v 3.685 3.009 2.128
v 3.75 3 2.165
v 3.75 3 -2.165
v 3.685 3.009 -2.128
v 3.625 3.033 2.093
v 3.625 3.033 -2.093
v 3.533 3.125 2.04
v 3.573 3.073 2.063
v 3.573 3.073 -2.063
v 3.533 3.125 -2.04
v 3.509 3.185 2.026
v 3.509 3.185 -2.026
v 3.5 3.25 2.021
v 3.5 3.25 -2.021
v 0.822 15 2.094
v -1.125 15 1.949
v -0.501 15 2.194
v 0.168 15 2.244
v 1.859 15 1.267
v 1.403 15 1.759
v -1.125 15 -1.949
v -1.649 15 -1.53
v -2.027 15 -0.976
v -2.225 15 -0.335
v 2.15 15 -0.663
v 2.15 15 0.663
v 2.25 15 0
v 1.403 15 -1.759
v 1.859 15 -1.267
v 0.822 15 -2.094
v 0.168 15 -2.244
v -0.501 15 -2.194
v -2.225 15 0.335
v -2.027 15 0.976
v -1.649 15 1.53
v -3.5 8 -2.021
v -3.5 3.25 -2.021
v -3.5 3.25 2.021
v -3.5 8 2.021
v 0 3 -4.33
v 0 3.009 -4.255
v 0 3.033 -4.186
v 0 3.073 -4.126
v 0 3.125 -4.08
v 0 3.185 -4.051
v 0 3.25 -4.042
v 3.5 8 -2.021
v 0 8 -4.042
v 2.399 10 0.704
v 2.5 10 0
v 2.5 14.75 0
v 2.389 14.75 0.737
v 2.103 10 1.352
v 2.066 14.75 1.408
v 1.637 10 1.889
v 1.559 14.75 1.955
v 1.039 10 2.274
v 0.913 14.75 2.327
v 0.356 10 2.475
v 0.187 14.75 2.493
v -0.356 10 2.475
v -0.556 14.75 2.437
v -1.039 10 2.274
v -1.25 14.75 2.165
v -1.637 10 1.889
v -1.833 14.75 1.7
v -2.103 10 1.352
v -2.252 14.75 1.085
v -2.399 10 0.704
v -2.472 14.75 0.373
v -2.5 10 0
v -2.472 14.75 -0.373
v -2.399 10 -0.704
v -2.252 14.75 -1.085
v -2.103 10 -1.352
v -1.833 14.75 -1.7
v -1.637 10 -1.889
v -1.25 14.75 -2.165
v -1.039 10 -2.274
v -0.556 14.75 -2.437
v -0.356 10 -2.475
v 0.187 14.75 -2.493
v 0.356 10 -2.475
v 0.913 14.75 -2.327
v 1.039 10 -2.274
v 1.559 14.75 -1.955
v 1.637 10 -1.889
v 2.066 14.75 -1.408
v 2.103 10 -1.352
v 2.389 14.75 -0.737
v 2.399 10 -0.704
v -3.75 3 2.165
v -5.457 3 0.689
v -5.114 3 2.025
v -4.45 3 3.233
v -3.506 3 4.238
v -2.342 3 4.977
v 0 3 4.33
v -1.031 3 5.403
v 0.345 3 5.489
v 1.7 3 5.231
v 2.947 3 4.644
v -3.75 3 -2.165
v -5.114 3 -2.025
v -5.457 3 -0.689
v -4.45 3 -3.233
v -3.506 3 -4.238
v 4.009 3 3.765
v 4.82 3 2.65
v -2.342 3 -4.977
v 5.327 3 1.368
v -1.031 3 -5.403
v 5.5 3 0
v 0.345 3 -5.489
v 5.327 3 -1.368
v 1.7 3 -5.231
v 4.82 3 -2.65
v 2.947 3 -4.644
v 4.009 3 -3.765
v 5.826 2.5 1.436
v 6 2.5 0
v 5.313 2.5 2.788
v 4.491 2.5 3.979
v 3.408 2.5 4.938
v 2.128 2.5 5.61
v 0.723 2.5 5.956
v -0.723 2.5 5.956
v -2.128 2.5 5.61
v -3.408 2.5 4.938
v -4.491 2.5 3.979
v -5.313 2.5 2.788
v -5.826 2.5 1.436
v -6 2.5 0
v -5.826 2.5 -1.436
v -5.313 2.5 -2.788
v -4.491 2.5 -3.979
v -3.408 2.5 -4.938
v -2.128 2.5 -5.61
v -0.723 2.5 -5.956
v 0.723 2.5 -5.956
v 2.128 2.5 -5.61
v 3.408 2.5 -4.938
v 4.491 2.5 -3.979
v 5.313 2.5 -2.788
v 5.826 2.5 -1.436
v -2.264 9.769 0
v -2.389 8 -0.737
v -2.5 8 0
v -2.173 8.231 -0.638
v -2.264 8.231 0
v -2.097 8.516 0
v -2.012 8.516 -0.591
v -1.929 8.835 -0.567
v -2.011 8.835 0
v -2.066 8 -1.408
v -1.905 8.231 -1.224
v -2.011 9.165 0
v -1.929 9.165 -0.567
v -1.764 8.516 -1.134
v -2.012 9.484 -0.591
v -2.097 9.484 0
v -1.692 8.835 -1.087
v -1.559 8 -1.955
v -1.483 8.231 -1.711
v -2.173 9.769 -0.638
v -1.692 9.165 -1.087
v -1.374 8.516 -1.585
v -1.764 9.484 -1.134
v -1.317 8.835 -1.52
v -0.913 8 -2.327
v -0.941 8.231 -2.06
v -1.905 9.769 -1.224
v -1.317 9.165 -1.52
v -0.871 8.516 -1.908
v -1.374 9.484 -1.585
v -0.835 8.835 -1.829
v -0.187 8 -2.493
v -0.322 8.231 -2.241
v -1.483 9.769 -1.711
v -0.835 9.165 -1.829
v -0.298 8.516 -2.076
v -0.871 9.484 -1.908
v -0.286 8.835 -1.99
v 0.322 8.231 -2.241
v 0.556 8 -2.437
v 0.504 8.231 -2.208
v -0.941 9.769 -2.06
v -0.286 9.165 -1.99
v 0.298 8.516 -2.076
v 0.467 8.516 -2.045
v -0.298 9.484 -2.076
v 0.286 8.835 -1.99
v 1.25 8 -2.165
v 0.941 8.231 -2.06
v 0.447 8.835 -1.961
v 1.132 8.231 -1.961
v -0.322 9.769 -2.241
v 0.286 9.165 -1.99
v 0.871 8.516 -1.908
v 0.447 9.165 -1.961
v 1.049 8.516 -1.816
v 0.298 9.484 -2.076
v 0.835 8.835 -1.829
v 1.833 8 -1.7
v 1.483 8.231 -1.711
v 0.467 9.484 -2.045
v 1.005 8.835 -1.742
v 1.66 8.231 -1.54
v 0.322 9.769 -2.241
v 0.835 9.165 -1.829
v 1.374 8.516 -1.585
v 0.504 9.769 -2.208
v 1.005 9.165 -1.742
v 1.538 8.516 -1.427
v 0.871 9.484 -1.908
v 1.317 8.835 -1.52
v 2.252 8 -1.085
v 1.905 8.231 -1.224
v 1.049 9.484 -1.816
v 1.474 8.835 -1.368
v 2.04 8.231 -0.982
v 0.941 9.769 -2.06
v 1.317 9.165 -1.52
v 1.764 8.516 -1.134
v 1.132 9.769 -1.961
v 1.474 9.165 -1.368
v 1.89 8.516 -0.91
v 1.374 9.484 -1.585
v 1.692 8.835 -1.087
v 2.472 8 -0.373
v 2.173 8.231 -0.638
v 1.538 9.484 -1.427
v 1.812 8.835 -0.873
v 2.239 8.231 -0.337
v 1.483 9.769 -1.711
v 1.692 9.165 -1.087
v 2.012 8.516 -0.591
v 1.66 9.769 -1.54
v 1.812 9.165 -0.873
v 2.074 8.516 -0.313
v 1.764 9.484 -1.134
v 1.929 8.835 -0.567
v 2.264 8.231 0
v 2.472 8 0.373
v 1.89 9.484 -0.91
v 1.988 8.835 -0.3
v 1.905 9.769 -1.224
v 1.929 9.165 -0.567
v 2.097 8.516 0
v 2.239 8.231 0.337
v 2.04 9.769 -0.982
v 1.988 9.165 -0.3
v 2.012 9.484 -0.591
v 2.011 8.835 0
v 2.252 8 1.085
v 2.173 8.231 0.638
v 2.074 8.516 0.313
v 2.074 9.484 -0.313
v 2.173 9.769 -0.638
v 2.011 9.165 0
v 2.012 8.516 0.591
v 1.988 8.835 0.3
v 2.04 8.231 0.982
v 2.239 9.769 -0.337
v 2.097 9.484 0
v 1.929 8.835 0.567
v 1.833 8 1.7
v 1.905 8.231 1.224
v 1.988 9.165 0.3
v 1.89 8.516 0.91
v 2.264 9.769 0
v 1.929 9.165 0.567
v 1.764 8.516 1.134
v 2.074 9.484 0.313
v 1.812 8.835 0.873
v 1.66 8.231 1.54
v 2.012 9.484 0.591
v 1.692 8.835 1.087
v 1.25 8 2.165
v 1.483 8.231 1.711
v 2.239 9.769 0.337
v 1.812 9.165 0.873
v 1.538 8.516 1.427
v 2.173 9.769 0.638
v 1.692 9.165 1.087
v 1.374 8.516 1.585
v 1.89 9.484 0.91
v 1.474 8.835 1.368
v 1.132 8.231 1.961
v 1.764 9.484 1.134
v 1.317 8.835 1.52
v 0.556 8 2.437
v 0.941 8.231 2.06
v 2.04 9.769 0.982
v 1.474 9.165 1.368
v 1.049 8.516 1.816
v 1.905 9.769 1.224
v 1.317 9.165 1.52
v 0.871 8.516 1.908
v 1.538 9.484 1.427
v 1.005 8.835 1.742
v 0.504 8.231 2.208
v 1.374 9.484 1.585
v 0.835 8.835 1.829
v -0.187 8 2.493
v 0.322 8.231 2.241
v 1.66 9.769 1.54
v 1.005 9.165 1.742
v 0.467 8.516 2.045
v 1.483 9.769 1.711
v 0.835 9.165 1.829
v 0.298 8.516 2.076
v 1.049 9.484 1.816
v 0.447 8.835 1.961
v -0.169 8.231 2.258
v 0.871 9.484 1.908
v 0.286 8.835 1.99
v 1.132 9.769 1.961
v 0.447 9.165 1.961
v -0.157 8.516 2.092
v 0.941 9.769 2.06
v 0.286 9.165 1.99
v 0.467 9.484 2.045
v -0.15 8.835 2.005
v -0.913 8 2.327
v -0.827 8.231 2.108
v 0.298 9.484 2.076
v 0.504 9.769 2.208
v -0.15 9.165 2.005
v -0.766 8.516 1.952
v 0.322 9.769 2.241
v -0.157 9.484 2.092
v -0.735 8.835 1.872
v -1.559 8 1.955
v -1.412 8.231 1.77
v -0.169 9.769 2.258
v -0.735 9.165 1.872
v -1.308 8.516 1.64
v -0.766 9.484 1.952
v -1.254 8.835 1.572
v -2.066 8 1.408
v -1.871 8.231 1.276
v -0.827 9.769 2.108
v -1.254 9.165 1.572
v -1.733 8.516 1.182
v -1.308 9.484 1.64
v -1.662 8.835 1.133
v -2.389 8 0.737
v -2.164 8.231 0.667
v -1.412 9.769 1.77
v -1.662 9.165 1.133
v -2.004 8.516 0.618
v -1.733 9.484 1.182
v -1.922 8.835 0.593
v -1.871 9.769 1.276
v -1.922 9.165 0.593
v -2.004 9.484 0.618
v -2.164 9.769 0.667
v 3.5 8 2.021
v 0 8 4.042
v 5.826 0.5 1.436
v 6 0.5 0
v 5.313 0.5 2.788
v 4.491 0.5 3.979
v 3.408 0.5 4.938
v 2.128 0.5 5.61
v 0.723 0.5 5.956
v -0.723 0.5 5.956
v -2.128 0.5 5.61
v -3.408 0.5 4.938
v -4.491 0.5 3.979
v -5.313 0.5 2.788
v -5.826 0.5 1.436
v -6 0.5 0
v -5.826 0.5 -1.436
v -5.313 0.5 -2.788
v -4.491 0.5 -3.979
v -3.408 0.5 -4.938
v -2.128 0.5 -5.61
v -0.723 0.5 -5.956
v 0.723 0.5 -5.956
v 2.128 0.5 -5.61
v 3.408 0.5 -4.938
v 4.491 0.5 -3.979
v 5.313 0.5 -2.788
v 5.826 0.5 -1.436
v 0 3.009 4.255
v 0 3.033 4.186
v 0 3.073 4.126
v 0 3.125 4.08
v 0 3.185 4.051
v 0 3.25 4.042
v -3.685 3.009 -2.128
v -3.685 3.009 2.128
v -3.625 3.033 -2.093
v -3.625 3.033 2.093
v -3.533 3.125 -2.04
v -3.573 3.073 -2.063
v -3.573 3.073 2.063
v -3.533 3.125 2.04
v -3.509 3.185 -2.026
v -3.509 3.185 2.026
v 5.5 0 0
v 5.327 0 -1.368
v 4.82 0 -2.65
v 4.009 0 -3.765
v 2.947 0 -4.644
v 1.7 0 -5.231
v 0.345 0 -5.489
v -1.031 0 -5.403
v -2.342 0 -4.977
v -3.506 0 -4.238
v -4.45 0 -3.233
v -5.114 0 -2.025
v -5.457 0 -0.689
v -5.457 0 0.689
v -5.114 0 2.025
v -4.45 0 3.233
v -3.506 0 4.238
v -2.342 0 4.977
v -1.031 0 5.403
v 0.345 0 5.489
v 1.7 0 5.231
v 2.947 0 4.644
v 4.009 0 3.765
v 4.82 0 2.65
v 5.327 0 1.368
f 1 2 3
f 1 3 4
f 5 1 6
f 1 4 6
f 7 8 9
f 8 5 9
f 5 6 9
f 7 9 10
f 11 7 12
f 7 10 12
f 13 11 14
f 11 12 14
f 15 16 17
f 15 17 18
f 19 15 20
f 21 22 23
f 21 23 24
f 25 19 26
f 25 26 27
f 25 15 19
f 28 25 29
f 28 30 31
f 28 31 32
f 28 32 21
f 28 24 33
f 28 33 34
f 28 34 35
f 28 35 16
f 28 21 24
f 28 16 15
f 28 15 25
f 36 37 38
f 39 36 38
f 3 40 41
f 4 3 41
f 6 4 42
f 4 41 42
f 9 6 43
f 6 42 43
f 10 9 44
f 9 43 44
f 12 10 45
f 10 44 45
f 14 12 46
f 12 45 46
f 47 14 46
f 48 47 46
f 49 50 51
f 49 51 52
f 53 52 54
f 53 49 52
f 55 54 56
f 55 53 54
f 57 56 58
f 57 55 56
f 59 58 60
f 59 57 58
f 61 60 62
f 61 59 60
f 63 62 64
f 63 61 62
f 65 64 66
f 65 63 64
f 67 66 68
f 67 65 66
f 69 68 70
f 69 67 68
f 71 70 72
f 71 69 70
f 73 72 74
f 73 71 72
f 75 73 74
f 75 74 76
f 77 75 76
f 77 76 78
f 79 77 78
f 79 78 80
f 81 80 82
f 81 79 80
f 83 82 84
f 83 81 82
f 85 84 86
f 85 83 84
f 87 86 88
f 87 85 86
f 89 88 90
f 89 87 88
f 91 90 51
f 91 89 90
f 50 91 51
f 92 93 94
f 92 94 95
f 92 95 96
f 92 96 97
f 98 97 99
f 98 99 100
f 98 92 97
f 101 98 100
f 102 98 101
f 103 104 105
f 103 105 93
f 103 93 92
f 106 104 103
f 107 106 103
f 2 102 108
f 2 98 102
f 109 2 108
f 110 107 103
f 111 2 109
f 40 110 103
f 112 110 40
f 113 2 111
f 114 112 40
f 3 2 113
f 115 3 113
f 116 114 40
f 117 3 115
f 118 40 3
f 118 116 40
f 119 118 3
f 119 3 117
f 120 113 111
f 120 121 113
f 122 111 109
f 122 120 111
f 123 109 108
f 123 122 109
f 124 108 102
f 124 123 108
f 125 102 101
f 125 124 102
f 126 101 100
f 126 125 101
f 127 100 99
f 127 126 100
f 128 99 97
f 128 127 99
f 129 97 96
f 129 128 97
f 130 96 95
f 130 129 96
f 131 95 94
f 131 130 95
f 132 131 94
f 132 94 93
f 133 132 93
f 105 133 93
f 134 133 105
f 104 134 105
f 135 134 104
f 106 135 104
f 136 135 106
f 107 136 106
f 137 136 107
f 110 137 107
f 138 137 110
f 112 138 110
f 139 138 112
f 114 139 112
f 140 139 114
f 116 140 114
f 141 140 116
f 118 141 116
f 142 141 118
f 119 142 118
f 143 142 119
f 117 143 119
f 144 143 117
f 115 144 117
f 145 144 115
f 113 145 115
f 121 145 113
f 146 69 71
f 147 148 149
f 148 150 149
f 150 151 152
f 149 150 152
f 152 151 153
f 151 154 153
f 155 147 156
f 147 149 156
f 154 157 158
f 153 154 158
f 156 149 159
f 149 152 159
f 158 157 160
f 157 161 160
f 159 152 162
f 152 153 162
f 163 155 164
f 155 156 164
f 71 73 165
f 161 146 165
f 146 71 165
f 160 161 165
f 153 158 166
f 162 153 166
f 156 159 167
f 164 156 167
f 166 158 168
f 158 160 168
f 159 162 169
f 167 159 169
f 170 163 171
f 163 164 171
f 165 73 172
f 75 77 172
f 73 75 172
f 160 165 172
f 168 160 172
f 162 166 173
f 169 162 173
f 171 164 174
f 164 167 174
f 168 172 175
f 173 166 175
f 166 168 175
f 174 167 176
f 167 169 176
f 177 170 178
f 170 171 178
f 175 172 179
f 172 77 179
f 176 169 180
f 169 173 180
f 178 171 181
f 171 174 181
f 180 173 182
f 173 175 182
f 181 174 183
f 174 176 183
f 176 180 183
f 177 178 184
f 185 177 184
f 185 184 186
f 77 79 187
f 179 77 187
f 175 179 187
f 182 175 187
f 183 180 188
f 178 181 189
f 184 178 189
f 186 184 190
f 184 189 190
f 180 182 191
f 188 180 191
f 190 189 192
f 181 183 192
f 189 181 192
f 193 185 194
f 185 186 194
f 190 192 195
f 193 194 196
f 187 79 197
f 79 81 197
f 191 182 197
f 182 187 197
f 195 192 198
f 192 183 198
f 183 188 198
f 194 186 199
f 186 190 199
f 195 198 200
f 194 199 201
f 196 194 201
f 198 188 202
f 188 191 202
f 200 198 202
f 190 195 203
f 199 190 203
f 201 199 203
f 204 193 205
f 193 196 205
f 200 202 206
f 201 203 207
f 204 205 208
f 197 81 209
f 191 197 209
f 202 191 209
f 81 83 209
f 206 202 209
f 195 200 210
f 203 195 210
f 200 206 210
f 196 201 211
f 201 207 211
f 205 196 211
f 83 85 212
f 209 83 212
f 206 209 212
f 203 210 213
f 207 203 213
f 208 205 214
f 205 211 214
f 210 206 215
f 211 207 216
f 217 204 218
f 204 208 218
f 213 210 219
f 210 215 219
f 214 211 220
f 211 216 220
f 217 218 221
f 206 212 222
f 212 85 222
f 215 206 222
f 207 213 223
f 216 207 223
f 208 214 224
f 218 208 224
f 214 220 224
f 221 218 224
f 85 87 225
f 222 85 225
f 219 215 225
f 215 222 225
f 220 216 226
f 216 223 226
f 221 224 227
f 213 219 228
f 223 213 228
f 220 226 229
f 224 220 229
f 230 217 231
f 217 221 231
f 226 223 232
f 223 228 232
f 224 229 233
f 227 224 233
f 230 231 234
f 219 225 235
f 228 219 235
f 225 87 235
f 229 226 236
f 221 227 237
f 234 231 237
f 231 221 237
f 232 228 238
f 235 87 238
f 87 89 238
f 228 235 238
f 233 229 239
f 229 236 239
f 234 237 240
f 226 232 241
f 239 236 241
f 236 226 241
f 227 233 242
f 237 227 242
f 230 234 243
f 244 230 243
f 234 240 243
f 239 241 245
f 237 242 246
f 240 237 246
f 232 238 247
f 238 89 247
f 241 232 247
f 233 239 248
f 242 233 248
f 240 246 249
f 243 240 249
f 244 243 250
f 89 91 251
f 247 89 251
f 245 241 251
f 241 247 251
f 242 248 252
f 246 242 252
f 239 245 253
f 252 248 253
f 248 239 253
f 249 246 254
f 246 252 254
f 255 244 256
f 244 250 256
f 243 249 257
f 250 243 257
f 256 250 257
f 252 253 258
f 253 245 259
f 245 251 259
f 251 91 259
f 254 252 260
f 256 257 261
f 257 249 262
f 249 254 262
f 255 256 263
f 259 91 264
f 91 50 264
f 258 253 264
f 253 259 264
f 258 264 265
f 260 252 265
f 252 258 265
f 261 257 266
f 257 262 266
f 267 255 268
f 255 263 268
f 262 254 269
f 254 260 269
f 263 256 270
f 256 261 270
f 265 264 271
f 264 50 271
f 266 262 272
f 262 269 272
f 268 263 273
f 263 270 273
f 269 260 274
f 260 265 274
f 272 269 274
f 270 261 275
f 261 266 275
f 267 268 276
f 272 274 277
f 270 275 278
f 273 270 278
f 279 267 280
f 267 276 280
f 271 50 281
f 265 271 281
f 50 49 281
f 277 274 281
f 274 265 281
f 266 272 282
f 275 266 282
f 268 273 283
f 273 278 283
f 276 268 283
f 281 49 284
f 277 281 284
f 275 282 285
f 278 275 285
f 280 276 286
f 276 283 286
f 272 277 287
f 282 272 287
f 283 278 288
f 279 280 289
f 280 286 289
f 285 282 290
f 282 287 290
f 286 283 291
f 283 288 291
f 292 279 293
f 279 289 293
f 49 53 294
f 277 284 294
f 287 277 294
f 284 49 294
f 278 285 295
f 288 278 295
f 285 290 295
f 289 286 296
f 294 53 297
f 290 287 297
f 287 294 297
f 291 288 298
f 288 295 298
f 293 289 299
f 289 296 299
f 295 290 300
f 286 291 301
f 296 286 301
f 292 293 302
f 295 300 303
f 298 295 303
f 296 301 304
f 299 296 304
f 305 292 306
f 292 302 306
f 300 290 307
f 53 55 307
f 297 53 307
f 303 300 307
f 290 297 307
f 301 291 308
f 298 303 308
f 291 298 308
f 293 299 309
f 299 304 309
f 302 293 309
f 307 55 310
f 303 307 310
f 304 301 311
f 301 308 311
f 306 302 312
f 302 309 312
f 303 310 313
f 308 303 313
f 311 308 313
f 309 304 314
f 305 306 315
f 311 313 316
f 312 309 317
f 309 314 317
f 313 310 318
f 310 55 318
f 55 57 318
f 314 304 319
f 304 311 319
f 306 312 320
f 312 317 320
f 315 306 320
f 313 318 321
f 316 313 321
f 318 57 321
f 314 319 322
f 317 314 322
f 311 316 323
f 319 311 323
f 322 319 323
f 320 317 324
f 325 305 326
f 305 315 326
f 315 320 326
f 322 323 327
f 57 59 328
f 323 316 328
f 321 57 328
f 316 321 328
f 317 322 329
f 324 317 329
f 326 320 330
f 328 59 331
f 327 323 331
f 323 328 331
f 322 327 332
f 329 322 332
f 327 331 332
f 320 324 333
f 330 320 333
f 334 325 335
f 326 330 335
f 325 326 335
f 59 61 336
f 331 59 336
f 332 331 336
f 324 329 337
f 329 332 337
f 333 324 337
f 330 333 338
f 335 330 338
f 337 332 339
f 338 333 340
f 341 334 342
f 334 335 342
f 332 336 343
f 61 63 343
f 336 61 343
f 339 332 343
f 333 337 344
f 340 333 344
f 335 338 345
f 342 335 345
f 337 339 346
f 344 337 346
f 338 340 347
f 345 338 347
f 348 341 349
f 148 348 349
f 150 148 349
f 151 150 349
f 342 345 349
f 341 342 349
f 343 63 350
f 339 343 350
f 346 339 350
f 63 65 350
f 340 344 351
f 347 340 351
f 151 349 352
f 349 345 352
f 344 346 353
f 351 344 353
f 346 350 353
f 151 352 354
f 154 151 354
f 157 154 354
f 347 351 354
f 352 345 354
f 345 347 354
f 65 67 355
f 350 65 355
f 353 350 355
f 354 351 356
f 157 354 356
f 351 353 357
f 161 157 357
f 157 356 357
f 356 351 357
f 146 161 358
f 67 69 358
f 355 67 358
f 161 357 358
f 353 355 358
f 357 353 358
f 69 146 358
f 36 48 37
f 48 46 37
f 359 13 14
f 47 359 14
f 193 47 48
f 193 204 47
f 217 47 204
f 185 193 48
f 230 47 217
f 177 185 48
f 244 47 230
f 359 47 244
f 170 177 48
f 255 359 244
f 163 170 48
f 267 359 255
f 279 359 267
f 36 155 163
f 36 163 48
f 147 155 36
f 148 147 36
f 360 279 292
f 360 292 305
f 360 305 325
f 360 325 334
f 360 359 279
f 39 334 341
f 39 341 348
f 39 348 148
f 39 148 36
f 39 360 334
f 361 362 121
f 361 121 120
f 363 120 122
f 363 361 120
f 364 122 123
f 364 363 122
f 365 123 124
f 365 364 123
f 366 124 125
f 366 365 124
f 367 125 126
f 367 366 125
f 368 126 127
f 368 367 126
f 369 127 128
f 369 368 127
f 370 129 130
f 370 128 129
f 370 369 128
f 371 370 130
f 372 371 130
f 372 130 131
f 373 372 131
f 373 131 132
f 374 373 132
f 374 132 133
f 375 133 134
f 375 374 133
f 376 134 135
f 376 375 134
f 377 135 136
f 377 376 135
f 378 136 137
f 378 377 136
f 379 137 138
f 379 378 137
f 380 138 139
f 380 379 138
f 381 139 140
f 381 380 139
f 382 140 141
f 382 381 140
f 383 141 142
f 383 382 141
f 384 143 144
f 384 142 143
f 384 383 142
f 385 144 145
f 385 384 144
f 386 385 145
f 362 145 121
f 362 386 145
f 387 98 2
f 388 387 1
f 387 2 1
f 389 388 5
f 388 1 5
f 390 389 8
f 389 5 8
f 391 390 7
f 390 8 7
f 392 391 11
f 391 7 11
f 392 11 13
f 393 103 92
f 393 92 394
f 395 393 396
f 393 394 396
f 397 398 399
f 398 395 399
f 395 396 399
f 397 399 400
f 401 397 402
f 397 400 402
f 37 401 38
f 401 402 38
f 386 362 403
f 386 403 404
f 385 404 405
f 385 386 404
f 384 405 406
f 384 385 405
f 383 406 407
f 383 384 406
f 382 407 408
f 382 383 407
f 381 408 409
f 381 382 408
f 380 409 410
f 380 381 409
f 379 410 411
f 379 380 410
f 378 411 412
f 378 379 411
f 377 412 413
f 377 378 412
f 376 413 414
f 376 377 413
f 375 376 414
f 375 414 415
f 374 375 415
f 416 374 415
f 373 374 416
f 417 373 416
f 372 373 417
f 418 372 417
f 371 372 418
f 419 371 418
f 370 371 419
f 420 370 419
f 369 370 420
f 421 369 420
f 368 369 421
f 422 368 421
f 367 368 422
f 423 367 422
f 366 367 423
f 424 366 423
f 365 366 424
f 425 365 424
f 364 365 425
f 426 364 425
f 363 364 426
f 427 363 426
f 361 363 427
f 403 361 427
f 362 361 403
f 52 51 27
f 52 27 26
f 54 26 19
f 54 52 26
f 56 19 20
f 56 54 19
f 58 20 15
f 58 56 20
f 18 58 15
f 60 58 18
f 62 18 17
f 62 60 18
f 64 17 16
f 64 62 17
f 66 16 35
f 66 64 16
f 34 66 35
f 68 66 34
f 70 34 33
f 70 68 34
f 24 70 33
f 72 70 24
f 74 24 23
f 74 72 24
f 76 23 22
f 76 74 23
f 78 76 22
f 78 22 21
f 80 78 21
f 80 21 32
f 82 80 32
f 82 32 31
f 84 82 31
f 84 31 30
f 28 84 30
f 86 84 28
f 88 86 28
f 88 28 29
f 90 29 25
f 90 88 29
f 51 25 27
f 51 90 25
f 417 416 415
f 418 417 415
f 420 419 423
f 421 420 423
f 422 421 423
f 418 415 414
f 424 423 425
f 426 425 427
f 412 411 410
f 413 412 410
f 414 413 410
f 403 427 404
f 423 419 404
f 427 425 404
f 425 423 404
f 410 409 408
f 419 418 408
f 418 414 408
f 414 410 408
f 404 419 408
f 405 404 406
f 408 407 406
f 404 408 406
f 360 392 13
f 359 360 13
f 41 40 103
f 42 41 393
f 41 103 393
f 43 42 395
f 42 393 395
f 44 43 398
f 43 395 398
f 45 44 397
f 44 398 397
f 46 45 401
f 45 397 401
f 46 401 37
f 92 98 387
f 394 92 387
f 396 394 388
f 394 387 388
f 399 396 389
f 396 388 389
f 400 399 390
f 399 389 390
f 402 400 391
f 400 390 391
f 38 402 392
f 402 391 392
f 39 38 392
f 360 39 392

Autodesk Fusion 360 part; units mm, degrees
sketch "Sketch1" plane through (0, 0, 0) normal (0, 1, 0) x (1, 0, 0)
  circle A0 centre (0, 0) radius 6
  dimension "d1" = 12
extrude "Extrude1" add sketch "Sketch1" along normal blind 3 makes body 1
chamfer "Chamfer1" distance 0.5 angle 45 2 edges at (-5.594, 3, 2.1697) (-5.594, 0, 2.1697) on bodies 1
sketch "Sketch2" plane through (0, 3, 0) normal (0, 1, 0) x (-1, 0, 0)
  circle A0 centre (0, 0) radius 5.5
  line L0 (-3.5, -2.0207) -> (0, -4.0415)
  line L1 (0, -4.0415) -> (3.5, -2.0207)
  line L2 (3.5, -2.0207) -> (3.5, 2.0207)
  line L3 (3.5, 2.0207) -> (0, 4.0415)
  line L4 (0, 4.0415) -> (-3.5, 2.0207)
  line L5 (-3.5, 2.0207) -> (-3.5, -2.0207)
extrude "Extrude2" add sketch "Sketch2" along normal blind 5 contours L0 L1 L2 L3 L4 L5 bodies 1
ref_plane "WorkPlane1" through (0, 10, 0) normal (0, 1, 0) x (0, 0, 1)
sketch "Sketch3" plane through (0, 10, 0) normal (0, 1, 0) x (1, 0, 0)
  circle A0 centre (0, 0) radius 2.5
  dimension "d8" = 5
extrude "Extrude3" add sketch "Sketch3" along normal blind 5 separate body makes body 2
sketch "Sketch4" plane through (0, 0, 0) normal (0, 0, 1) x (1, 0, 0)
  arc A0 (-2.5, 8) -> (-2.5, 10) centre (-3.25, 9) ccw
  line L0 (-2.5, 10) -> (0, 10)
  line L1 (0, 10) -> (0, 8)
  line L2 (0, 8) -> (-2.5, 8)
revolve "Revolve1" add sketch "Sketch4" angle 360 about axis through (0, 10, 0) along (0, -1, 0) bodies 1 2
chamfer "Chamfer2" distance 0.25 angle 45 1 edges at (-2.3308, 15, 0.904) on bodies 1
thread "Thread1" thread offset 0 thread length 10
fillet "Fillet1" radius 0.25 6 edges at (1.75, 3, 3.0311) (3.5, 3, 0) (1.75, 3, -3.0311) (-1.75, 3, -3.0311) (-3.5, 3, 0) (-1.75, 3, 3.0311) on bodies 1
